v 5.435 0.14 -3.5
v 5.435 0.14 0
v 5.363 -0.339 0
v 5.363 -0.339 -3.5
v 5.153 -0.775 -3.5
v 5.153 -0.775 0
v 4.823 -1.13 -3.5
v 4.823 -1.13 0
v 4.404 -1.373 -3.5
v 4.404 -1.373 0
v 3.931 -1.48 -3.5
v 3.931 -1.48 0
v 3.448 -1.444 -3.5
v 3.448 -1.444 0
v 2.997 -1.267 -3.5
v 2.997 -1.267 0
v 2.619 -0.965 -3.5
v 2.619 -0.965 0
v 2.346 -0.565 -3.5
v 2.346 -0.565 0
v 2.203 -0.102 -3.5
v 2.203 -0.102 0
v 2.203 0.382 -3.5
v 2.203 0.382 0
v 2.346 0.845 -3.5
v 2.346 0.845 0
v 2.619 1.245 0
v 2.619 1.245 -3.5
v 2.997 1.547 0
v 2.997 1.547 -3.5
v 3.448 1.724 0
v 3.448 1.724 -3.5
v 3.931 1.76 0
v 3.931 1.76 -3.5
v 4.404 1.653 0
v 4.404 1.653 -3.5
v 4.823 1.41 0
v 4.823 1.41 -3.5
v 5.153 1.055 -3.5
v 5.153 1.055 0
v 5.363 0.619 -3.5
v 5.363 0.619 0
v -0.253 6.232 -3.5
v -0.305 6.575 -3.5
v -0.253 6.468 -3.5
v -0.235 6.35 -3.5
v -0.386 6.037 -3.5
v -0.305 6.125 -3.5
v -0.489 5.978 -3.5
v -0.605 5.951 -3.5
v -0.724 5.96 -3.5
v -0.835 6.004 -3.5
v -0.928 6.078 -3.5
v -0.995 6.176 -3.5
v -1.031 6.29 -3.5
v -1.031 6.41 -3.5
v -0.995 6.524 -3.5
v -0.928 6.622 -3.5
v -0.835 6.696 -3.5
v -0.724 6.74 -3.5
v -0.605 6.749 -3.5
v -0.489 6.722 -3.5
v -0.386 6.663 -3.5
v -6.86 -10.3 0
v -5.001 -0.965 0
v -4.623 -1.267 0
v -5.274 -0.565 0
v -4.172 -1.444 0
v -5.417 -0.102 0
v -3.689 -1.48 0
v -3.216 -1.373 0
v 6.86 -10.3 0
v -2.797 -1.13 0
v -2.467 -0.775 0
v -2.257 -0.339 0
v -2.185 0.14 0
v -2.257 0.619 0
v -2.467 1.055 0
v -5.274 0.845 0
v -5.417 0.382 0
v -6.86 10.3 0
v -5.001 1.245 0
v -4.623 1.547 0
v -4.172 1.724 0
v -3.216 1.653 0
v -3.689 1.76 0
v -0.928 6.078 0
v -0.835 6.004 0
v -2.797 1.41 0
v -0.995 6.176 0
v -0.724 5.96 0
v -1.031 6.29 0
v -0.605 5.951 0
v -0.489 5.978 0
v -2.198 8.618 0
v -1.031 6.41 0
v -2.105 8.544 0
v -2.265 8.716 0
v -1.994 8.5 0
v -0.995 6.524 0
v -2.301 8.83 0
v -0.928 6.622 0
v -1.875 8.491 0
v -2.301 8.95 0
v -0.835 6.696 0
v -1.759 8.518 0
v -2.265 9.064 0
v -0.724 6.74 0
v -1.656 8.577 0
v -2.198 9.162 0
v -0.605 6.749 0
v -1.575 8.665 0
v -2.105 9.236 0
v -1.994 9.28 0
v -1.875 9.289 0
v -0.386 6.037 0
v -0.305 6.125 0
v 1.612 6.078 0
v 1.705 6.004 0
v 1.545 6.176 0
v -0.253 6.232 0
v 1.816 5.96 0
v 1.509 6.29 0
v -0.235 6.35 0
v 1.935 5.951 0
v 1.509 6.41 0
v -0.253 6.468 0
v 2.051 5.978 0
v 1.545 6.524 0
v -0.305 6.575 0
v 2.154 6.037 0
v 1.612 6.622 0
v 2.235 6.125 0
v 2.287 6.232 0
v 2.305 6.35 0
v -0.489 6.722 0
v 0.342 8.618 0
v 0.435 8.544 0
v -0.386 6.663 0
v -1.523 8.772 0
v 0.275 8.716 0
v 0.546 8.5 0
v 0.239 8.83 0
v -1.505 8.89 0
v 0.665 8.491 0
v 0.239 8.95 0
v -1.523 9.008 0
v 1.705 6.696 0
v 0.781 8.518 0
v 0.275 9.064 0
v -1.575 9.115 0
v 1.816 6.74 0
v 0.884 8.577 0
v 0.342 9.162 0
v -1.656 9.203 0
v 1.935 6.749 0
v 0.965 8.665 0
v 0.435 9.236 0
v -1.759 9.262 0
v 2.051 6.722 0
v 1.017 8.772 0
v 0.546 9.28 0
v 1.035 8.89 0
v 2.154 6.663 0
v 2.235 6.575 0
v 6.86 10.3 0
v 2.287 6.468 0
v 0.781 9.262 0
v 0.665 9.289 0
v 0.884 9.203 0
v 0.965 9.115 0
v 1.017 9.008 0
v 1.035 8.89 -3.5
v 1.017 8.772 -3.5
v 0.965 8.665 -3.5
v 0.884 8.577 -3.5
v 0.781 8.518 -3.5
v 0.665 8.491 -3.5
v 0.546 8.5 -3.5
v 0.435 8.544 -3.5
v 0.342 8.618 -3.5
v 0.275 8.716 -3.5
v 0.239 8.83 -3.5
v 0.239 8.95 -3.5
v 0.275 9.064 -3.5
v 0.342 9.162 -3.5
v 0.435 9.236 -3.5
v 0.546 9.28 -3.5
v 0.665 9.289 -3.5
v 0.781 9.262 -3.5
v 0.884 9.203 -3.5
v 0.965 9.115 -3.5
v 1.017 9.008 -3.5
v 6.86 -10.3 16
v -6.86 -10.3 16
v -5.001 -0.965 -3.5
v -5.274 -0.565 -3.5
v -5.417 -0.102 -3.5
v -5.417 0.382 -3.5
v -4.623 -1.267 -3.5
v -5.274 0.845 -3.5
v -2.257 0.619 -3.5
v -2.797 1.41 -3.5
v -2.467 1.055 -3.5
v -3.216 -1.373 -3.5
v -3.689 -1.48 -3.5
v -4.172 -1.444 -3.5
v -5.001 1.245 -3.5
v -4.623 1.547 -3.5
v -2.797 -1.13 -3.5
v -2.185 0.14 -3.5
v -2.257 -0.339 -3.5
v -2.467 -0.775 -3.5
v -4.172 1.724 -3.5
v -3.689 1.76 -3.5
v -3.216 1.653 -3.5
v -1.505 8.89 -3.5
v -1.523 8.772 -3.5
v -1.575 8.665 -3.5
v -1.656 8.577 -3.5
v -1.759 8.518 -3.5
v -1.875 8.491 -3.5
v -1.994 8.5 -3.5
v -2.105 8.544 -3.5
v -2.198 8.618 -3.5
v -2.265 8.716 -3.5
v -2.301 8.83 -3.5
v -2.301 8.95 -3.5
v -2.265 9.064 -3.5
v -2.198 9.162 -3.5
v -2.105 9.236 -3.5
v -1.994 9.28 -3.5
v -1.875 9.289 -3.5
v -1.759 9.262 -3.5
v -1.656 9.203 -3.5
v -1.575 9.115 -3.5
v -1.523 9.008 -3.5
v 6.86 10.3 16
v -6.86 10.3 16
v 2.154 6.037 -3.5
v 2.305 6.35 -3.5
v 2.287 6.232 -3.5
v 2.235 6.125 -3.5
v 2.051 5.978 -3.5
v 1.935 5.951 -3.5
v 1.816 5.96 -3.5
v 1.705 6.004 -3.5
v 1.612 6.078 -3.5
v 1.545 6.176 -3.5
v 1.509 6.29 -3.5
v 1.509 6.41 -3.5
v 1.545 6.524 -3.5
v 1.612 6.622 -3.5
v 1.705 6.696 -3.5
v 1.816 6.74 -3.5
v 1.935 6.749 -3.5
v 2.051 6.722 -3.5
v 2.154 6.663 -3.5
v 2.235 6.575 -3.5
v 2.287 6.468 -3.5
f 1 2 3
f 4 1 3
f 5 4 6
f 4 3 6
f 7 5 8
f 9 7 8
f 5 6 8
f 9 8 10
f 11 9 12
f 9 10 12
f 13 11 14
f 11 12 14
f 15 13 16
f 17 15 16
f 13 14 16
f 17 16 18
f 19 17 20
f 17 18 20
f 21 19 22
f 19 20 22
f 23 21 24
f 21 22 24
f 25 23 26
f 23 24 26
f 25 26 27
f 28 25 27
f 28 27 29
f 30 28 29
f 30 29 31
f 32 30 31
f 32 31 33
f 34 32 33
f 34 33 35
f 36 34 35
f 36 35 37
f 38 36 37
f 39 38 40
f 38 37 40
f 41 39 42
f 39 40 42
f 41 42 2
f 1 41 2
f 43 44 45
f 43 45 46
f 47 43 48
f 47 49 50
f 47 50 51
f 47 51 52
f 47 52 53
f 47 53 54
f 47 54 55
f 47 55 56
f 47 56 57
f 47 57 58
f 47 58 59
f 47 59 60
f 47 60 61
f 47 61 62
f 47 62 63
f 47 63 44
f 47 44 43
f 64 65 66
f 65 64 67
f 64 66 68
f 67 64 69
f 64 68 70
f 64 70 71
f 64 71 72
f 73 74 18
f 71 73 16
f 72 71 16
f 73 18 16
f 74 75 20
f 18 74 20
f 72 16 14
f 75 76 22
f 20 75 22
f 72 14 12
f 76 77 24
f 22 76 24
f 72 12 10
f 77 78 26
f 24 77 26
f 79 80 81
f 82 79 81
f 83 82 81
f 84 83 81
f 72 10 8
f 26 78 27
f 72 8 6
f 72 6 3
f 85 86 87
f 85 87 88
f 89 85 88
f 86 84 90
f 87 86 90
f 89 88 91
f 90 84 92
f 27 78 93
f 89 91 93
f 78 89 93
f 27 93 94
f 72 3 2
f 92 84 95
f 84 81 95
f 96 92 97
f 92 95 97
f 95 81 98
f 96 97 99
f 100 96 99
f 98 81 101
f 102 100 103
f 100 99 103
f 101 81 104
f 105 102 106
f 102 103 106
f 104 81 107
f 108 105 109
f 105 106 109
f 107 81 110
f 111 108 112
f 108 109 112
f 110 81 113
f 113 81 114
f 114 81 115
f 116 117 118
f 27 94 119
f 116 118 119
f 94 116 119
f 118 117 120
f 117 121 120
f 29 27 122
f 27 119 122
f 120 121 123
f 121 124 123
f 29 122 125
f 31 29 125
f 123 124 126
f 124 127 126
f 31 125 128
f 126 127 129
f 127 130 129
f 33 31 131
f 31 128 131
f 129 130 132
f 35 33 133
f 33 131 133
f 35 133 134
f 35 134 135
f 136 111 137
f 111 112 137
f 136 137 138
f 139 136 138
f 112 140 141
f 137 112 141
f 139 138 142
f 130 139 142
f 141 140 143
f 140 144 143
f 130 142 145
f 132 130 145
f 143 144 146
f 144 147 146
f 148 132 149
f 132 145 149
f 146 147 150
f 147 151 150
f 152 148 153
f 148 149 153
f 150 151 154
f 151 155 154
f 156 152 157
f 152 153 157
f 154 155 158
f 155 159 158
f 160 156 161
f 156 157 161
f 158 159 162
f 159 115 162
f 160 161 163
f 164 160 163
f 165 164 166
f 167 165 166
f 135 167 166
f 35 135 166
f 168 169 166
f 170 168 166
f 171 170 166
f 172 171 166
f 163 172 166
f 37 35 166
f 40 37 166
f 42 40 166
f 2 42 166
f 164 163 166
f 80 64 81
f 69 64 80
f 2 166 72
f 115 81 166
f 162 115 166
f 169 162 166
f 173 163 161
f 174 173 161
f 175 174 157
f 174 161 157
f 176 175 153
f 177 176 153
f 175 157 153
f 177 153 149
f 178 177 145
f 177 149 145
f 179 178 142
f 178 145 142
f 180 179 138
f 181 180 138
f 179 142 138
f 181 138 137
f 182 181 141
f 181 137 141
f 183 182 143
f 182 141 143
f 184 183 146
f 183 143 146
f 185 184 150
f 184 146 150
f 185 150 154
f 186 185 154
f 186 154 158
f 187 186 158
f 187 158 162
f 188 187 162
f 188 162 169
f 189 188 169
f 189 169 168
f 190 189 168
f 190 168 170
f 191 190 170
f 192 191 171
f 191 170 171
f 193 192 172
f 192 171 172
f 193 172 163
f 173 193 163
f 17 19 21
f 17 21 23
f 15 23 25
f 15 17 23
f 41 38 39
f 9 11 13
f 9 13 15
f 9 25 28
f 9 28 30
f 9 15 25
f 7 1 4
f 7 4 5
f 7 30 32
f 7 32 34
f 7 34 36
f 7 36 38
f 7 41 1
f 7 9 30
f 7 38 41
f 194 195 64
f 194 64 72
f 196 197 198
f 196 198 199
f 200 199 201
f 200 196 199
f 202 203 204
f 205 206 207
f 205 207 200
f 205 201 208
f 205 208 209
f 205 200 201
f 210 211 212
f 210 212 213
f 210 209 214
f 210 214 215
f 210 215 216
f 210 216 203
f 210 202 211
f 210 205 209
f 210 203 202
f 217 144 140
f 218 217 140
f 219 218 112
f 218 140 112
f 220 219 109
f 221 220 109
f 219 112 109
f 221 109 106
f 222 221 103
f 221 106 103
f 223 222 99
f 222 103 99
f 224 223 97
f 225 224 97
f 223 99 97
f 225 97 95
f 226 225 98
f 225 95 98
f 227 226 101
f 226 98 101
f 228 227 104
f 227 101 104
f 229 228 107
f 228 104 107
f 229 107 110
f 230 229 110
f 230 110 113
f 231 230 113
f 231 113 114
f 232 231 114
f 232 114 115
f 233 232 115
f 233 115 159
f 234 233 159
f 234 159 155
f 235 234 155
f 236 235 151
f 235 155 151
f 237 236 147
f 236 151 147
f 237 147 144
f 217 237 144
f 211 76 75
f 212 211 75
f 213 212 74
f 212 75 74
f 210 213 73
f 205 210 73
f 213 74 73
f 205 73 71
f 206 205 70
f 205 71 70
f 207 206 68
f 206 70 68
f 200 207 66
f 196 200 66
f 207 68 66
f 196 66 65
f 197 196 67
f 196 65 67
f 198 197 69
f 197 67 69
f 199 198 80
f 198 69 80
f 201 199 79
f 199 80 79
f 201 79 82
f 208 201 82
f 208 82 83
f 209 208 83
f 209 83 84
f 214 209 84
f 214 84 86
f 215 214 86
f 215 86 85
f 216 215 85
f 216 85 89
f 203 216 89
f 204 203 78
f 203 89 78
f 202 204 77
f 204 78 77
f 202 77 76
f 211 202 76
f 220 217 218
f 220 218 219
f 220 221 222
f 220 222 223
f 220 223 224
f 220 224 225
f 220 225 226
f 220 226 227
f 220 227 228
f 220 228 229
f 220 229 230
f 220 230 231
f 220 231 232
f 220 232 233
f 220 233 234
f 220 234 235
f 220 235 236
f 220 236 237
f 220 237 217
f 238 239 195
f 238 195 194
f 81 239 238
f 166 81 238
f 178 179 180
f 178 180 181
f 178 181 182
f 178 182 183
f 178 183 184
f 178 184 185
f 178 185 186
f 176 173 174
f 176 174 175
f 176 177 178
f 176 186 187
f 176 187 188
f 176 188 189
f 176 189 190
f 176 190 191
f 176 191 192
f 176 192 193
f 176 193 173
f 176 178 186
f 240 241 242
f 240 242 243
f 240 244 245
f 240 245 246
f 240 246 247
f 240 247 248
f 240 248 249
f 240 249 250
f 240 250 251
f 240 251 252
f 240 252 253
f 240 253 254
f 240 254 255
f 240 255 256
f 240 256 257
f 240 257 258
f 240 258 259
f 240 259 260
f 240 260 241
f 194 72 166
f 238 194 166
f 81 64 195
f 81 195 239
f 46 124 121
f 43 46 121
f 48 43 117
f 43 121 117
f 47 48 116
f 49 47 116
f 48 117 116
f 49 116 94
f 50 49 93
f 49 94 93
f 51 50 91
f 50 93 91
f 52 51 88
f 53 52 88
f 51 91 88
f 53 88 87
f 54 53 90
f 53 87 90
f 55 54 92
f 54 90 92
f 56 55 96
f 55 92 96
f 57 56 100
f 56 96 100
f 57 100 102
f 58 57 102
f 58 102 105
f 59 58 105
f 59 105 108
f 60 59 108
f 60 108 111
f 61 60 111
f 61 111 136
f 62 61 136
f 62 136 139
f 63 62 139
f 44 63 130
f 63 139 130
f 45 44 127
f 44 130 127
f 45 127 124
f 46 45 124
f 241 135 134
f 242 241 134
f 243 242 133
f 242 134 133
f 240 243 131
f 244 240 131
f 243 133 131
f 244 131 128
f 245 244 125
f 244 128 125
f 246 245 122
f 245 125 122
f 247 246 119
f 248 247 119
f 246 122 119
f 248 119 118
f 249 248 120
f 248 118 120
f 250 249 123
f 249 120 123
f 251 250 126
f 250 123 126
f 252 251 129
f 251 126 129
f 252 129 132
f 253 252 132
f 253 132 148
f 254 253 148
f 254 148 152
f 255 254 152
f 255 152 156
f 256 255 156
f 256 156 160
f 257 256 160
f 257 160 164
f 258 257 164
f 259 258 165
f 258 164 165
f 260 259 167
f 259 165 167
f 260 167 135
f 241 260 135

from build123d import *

# Parameters (mm, degrees)
F0_W     = 13.72
F0_H     = 20.6
F1_DEPTH = 16
F2_R     = 1.625
F3_DEPTH = 3.5
F4_R     = 0.4
F5_DEPTH = 3.5


with BuildPart() as f1:
    # F0 (on Top) → F1 (new body)
    with BuildSketch(Plane.XY):
        Rectangle(F0_W, F0_H)
    extrude(amount=F1_DEPTH)

    # F2 (on face) → F3 (join)
    with BuildSketch(Plane(origin=(0, 0, 0), x_dir=(1, 0, 0), z_dir=(0, 0, -1))):
        with Locations((-3.81, -0.14)):
            Circle(F2_R)
        with Locations((3.81, -0.14)):
            Circle(F2_R)
    extrude(amount=F3_DEPTH)

    # F4 (on face) → F5 (join)
    with BuildSketch(Plane(origin=(0, 0, 0), x_dir=(1, 0, 0), z_dir=(0, 0, -1))):
        with Locations((-0.635, -6.35)):
            Circle(F4_R)
        with Locations((1.905, -6.35)):
            Circle(F4_R)
        with Locations((-1.905, -8.89)):
            Circle(F4_R)
        with Locations((0.635, -8.89)):
            Circle(F4_R)
    extrude(amount=F5_DEPTH)


solid = f1.part
